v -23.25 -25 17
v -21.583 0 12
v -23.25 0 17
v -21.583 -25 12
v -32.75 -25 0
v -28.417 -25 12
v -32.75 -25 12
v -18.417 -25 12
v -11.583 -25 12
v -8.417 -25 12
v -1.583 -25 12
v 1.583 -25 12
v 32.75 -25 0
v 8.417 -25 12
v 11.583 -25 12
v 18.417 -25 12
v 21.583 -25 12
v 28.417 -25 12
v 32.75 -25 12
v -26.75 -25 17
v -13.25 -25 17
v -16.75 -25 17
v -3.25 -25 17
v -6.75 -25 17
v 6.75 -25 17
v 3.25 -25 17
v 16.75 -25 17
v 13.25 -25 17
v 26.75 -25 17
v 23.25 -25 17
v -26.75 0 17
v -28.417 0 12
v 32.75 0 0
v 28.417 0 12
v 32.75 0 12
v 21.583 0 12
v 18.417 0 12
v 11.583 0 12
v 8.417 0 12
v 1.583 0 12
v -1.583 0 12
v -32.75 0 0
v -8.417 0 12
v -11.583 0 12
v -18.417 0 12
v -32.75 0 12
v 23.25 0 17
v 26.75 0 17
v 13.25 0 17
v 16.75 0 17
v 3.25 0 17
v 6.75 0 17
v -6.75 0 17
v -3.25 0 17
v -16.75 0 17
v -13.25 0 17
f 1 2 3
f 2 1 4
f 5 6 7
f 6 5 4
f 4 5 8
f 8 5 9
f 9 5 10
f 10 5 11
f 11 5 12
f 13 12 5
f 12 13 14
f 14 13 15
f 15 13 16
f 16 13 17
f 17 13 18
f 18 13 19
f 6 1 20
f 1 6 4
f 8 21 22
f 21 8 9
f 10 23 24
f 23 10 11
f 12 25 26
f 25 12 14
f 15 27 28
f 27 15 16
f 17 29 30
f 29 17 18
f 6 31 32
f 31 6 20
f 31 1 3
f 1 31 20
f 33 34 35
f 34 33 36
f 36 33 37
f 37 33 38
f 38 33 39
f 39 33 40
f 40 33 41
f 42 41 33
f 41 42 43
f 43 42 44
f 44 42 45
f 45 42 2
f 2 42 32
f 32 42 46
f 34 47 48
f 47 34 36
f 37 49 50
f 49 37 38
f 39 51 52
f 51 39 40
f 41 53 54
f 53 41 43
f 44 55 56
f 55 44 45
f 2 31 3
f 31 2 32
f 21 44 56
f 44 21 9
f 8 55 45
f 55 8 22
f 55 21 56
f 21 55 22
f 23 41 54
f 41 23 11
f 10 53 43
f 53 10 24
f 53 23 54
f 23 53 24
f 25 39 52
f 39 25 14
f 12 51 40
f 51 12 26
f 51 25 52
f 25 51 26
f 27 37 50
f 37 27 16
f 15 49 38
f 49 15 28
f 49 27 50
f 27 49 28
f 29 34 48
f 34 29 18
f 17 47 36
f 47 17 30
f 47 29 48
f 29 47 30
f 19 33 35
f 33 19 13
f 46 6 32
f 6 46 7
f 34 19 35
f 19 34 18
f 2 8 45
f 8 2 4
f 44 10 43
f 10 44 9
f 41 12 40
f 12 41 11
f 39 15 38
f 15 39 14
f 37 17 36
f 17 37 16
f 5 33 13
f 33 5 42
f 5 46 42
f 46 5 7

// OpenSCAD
$fn = 32;

// ----------------------------------------------------------------------
// Toothed rack, 6 teeth
// 10 mm pitch, 5 mm teeth
// ----------------------------------------------------------------------

// --- parameters (mm) ---
bar_w = 25;     // bar width (Y)
bar_h = 12;     // bar height (Z)
teeth = 6;      // number of teeth
pitch = 10;     // tooth pitch
tooth_h = 5;    // tooth height above the bar
root_w = 7.5;   // tooth width at the root
crest_w = 3.5;  // tooth width at the crest

// --- derived feature positions (mm) ---
span = (teeth - 1) * pitch;  // = 50   distance between the outer teeth
bar_l = span + root_w + 8;   // = 65.5   bar length: teeth plus 4 mm at each end
tooth_x = -span / 2;         // = -25   X of the first tooth
height = bar_h + tooth_h;    // = 17   overall height
feature_centers = [
  [tooth_x + 0 * pitch, -bar_w / 2],
  [tooth_x + 1 * pitch, -bar_w / 2],
  [tooth_x + 2 * pitch, -bar_w / 2],
  [tooth_x + 3 * pitch, -bar_w / 2],
  [tooth_x + 4 * pitch, -bar_w / 2],
  [tooth_x + 5 * pitch, -bar_w / 2]
];   // tooth centre line, drives the tooth loop

// bar with a rack of teeth, one extruded trapezoium per centre
module rack_tooth() {
  linear_extrude(height = bar_w)
    polygon(points = [
      [0, 0],
      [root_w, 0],
      [root_w / 2 + crest_w / 2, tooth_h + 1],
      [root_w / 2 - crest_w / 2, tooth_h + 1]
    ]);
}

union() {
  translate([-bar_l / 2, -bar_w, 0]) cube([bar_l, bar_w, bar_h]);
  for (centre = feature_centers)
    translate([centre[0] - root_w / 2, 0, bar_h - 1]) rotate([90, 0, 0]) rack_tooth();
}
